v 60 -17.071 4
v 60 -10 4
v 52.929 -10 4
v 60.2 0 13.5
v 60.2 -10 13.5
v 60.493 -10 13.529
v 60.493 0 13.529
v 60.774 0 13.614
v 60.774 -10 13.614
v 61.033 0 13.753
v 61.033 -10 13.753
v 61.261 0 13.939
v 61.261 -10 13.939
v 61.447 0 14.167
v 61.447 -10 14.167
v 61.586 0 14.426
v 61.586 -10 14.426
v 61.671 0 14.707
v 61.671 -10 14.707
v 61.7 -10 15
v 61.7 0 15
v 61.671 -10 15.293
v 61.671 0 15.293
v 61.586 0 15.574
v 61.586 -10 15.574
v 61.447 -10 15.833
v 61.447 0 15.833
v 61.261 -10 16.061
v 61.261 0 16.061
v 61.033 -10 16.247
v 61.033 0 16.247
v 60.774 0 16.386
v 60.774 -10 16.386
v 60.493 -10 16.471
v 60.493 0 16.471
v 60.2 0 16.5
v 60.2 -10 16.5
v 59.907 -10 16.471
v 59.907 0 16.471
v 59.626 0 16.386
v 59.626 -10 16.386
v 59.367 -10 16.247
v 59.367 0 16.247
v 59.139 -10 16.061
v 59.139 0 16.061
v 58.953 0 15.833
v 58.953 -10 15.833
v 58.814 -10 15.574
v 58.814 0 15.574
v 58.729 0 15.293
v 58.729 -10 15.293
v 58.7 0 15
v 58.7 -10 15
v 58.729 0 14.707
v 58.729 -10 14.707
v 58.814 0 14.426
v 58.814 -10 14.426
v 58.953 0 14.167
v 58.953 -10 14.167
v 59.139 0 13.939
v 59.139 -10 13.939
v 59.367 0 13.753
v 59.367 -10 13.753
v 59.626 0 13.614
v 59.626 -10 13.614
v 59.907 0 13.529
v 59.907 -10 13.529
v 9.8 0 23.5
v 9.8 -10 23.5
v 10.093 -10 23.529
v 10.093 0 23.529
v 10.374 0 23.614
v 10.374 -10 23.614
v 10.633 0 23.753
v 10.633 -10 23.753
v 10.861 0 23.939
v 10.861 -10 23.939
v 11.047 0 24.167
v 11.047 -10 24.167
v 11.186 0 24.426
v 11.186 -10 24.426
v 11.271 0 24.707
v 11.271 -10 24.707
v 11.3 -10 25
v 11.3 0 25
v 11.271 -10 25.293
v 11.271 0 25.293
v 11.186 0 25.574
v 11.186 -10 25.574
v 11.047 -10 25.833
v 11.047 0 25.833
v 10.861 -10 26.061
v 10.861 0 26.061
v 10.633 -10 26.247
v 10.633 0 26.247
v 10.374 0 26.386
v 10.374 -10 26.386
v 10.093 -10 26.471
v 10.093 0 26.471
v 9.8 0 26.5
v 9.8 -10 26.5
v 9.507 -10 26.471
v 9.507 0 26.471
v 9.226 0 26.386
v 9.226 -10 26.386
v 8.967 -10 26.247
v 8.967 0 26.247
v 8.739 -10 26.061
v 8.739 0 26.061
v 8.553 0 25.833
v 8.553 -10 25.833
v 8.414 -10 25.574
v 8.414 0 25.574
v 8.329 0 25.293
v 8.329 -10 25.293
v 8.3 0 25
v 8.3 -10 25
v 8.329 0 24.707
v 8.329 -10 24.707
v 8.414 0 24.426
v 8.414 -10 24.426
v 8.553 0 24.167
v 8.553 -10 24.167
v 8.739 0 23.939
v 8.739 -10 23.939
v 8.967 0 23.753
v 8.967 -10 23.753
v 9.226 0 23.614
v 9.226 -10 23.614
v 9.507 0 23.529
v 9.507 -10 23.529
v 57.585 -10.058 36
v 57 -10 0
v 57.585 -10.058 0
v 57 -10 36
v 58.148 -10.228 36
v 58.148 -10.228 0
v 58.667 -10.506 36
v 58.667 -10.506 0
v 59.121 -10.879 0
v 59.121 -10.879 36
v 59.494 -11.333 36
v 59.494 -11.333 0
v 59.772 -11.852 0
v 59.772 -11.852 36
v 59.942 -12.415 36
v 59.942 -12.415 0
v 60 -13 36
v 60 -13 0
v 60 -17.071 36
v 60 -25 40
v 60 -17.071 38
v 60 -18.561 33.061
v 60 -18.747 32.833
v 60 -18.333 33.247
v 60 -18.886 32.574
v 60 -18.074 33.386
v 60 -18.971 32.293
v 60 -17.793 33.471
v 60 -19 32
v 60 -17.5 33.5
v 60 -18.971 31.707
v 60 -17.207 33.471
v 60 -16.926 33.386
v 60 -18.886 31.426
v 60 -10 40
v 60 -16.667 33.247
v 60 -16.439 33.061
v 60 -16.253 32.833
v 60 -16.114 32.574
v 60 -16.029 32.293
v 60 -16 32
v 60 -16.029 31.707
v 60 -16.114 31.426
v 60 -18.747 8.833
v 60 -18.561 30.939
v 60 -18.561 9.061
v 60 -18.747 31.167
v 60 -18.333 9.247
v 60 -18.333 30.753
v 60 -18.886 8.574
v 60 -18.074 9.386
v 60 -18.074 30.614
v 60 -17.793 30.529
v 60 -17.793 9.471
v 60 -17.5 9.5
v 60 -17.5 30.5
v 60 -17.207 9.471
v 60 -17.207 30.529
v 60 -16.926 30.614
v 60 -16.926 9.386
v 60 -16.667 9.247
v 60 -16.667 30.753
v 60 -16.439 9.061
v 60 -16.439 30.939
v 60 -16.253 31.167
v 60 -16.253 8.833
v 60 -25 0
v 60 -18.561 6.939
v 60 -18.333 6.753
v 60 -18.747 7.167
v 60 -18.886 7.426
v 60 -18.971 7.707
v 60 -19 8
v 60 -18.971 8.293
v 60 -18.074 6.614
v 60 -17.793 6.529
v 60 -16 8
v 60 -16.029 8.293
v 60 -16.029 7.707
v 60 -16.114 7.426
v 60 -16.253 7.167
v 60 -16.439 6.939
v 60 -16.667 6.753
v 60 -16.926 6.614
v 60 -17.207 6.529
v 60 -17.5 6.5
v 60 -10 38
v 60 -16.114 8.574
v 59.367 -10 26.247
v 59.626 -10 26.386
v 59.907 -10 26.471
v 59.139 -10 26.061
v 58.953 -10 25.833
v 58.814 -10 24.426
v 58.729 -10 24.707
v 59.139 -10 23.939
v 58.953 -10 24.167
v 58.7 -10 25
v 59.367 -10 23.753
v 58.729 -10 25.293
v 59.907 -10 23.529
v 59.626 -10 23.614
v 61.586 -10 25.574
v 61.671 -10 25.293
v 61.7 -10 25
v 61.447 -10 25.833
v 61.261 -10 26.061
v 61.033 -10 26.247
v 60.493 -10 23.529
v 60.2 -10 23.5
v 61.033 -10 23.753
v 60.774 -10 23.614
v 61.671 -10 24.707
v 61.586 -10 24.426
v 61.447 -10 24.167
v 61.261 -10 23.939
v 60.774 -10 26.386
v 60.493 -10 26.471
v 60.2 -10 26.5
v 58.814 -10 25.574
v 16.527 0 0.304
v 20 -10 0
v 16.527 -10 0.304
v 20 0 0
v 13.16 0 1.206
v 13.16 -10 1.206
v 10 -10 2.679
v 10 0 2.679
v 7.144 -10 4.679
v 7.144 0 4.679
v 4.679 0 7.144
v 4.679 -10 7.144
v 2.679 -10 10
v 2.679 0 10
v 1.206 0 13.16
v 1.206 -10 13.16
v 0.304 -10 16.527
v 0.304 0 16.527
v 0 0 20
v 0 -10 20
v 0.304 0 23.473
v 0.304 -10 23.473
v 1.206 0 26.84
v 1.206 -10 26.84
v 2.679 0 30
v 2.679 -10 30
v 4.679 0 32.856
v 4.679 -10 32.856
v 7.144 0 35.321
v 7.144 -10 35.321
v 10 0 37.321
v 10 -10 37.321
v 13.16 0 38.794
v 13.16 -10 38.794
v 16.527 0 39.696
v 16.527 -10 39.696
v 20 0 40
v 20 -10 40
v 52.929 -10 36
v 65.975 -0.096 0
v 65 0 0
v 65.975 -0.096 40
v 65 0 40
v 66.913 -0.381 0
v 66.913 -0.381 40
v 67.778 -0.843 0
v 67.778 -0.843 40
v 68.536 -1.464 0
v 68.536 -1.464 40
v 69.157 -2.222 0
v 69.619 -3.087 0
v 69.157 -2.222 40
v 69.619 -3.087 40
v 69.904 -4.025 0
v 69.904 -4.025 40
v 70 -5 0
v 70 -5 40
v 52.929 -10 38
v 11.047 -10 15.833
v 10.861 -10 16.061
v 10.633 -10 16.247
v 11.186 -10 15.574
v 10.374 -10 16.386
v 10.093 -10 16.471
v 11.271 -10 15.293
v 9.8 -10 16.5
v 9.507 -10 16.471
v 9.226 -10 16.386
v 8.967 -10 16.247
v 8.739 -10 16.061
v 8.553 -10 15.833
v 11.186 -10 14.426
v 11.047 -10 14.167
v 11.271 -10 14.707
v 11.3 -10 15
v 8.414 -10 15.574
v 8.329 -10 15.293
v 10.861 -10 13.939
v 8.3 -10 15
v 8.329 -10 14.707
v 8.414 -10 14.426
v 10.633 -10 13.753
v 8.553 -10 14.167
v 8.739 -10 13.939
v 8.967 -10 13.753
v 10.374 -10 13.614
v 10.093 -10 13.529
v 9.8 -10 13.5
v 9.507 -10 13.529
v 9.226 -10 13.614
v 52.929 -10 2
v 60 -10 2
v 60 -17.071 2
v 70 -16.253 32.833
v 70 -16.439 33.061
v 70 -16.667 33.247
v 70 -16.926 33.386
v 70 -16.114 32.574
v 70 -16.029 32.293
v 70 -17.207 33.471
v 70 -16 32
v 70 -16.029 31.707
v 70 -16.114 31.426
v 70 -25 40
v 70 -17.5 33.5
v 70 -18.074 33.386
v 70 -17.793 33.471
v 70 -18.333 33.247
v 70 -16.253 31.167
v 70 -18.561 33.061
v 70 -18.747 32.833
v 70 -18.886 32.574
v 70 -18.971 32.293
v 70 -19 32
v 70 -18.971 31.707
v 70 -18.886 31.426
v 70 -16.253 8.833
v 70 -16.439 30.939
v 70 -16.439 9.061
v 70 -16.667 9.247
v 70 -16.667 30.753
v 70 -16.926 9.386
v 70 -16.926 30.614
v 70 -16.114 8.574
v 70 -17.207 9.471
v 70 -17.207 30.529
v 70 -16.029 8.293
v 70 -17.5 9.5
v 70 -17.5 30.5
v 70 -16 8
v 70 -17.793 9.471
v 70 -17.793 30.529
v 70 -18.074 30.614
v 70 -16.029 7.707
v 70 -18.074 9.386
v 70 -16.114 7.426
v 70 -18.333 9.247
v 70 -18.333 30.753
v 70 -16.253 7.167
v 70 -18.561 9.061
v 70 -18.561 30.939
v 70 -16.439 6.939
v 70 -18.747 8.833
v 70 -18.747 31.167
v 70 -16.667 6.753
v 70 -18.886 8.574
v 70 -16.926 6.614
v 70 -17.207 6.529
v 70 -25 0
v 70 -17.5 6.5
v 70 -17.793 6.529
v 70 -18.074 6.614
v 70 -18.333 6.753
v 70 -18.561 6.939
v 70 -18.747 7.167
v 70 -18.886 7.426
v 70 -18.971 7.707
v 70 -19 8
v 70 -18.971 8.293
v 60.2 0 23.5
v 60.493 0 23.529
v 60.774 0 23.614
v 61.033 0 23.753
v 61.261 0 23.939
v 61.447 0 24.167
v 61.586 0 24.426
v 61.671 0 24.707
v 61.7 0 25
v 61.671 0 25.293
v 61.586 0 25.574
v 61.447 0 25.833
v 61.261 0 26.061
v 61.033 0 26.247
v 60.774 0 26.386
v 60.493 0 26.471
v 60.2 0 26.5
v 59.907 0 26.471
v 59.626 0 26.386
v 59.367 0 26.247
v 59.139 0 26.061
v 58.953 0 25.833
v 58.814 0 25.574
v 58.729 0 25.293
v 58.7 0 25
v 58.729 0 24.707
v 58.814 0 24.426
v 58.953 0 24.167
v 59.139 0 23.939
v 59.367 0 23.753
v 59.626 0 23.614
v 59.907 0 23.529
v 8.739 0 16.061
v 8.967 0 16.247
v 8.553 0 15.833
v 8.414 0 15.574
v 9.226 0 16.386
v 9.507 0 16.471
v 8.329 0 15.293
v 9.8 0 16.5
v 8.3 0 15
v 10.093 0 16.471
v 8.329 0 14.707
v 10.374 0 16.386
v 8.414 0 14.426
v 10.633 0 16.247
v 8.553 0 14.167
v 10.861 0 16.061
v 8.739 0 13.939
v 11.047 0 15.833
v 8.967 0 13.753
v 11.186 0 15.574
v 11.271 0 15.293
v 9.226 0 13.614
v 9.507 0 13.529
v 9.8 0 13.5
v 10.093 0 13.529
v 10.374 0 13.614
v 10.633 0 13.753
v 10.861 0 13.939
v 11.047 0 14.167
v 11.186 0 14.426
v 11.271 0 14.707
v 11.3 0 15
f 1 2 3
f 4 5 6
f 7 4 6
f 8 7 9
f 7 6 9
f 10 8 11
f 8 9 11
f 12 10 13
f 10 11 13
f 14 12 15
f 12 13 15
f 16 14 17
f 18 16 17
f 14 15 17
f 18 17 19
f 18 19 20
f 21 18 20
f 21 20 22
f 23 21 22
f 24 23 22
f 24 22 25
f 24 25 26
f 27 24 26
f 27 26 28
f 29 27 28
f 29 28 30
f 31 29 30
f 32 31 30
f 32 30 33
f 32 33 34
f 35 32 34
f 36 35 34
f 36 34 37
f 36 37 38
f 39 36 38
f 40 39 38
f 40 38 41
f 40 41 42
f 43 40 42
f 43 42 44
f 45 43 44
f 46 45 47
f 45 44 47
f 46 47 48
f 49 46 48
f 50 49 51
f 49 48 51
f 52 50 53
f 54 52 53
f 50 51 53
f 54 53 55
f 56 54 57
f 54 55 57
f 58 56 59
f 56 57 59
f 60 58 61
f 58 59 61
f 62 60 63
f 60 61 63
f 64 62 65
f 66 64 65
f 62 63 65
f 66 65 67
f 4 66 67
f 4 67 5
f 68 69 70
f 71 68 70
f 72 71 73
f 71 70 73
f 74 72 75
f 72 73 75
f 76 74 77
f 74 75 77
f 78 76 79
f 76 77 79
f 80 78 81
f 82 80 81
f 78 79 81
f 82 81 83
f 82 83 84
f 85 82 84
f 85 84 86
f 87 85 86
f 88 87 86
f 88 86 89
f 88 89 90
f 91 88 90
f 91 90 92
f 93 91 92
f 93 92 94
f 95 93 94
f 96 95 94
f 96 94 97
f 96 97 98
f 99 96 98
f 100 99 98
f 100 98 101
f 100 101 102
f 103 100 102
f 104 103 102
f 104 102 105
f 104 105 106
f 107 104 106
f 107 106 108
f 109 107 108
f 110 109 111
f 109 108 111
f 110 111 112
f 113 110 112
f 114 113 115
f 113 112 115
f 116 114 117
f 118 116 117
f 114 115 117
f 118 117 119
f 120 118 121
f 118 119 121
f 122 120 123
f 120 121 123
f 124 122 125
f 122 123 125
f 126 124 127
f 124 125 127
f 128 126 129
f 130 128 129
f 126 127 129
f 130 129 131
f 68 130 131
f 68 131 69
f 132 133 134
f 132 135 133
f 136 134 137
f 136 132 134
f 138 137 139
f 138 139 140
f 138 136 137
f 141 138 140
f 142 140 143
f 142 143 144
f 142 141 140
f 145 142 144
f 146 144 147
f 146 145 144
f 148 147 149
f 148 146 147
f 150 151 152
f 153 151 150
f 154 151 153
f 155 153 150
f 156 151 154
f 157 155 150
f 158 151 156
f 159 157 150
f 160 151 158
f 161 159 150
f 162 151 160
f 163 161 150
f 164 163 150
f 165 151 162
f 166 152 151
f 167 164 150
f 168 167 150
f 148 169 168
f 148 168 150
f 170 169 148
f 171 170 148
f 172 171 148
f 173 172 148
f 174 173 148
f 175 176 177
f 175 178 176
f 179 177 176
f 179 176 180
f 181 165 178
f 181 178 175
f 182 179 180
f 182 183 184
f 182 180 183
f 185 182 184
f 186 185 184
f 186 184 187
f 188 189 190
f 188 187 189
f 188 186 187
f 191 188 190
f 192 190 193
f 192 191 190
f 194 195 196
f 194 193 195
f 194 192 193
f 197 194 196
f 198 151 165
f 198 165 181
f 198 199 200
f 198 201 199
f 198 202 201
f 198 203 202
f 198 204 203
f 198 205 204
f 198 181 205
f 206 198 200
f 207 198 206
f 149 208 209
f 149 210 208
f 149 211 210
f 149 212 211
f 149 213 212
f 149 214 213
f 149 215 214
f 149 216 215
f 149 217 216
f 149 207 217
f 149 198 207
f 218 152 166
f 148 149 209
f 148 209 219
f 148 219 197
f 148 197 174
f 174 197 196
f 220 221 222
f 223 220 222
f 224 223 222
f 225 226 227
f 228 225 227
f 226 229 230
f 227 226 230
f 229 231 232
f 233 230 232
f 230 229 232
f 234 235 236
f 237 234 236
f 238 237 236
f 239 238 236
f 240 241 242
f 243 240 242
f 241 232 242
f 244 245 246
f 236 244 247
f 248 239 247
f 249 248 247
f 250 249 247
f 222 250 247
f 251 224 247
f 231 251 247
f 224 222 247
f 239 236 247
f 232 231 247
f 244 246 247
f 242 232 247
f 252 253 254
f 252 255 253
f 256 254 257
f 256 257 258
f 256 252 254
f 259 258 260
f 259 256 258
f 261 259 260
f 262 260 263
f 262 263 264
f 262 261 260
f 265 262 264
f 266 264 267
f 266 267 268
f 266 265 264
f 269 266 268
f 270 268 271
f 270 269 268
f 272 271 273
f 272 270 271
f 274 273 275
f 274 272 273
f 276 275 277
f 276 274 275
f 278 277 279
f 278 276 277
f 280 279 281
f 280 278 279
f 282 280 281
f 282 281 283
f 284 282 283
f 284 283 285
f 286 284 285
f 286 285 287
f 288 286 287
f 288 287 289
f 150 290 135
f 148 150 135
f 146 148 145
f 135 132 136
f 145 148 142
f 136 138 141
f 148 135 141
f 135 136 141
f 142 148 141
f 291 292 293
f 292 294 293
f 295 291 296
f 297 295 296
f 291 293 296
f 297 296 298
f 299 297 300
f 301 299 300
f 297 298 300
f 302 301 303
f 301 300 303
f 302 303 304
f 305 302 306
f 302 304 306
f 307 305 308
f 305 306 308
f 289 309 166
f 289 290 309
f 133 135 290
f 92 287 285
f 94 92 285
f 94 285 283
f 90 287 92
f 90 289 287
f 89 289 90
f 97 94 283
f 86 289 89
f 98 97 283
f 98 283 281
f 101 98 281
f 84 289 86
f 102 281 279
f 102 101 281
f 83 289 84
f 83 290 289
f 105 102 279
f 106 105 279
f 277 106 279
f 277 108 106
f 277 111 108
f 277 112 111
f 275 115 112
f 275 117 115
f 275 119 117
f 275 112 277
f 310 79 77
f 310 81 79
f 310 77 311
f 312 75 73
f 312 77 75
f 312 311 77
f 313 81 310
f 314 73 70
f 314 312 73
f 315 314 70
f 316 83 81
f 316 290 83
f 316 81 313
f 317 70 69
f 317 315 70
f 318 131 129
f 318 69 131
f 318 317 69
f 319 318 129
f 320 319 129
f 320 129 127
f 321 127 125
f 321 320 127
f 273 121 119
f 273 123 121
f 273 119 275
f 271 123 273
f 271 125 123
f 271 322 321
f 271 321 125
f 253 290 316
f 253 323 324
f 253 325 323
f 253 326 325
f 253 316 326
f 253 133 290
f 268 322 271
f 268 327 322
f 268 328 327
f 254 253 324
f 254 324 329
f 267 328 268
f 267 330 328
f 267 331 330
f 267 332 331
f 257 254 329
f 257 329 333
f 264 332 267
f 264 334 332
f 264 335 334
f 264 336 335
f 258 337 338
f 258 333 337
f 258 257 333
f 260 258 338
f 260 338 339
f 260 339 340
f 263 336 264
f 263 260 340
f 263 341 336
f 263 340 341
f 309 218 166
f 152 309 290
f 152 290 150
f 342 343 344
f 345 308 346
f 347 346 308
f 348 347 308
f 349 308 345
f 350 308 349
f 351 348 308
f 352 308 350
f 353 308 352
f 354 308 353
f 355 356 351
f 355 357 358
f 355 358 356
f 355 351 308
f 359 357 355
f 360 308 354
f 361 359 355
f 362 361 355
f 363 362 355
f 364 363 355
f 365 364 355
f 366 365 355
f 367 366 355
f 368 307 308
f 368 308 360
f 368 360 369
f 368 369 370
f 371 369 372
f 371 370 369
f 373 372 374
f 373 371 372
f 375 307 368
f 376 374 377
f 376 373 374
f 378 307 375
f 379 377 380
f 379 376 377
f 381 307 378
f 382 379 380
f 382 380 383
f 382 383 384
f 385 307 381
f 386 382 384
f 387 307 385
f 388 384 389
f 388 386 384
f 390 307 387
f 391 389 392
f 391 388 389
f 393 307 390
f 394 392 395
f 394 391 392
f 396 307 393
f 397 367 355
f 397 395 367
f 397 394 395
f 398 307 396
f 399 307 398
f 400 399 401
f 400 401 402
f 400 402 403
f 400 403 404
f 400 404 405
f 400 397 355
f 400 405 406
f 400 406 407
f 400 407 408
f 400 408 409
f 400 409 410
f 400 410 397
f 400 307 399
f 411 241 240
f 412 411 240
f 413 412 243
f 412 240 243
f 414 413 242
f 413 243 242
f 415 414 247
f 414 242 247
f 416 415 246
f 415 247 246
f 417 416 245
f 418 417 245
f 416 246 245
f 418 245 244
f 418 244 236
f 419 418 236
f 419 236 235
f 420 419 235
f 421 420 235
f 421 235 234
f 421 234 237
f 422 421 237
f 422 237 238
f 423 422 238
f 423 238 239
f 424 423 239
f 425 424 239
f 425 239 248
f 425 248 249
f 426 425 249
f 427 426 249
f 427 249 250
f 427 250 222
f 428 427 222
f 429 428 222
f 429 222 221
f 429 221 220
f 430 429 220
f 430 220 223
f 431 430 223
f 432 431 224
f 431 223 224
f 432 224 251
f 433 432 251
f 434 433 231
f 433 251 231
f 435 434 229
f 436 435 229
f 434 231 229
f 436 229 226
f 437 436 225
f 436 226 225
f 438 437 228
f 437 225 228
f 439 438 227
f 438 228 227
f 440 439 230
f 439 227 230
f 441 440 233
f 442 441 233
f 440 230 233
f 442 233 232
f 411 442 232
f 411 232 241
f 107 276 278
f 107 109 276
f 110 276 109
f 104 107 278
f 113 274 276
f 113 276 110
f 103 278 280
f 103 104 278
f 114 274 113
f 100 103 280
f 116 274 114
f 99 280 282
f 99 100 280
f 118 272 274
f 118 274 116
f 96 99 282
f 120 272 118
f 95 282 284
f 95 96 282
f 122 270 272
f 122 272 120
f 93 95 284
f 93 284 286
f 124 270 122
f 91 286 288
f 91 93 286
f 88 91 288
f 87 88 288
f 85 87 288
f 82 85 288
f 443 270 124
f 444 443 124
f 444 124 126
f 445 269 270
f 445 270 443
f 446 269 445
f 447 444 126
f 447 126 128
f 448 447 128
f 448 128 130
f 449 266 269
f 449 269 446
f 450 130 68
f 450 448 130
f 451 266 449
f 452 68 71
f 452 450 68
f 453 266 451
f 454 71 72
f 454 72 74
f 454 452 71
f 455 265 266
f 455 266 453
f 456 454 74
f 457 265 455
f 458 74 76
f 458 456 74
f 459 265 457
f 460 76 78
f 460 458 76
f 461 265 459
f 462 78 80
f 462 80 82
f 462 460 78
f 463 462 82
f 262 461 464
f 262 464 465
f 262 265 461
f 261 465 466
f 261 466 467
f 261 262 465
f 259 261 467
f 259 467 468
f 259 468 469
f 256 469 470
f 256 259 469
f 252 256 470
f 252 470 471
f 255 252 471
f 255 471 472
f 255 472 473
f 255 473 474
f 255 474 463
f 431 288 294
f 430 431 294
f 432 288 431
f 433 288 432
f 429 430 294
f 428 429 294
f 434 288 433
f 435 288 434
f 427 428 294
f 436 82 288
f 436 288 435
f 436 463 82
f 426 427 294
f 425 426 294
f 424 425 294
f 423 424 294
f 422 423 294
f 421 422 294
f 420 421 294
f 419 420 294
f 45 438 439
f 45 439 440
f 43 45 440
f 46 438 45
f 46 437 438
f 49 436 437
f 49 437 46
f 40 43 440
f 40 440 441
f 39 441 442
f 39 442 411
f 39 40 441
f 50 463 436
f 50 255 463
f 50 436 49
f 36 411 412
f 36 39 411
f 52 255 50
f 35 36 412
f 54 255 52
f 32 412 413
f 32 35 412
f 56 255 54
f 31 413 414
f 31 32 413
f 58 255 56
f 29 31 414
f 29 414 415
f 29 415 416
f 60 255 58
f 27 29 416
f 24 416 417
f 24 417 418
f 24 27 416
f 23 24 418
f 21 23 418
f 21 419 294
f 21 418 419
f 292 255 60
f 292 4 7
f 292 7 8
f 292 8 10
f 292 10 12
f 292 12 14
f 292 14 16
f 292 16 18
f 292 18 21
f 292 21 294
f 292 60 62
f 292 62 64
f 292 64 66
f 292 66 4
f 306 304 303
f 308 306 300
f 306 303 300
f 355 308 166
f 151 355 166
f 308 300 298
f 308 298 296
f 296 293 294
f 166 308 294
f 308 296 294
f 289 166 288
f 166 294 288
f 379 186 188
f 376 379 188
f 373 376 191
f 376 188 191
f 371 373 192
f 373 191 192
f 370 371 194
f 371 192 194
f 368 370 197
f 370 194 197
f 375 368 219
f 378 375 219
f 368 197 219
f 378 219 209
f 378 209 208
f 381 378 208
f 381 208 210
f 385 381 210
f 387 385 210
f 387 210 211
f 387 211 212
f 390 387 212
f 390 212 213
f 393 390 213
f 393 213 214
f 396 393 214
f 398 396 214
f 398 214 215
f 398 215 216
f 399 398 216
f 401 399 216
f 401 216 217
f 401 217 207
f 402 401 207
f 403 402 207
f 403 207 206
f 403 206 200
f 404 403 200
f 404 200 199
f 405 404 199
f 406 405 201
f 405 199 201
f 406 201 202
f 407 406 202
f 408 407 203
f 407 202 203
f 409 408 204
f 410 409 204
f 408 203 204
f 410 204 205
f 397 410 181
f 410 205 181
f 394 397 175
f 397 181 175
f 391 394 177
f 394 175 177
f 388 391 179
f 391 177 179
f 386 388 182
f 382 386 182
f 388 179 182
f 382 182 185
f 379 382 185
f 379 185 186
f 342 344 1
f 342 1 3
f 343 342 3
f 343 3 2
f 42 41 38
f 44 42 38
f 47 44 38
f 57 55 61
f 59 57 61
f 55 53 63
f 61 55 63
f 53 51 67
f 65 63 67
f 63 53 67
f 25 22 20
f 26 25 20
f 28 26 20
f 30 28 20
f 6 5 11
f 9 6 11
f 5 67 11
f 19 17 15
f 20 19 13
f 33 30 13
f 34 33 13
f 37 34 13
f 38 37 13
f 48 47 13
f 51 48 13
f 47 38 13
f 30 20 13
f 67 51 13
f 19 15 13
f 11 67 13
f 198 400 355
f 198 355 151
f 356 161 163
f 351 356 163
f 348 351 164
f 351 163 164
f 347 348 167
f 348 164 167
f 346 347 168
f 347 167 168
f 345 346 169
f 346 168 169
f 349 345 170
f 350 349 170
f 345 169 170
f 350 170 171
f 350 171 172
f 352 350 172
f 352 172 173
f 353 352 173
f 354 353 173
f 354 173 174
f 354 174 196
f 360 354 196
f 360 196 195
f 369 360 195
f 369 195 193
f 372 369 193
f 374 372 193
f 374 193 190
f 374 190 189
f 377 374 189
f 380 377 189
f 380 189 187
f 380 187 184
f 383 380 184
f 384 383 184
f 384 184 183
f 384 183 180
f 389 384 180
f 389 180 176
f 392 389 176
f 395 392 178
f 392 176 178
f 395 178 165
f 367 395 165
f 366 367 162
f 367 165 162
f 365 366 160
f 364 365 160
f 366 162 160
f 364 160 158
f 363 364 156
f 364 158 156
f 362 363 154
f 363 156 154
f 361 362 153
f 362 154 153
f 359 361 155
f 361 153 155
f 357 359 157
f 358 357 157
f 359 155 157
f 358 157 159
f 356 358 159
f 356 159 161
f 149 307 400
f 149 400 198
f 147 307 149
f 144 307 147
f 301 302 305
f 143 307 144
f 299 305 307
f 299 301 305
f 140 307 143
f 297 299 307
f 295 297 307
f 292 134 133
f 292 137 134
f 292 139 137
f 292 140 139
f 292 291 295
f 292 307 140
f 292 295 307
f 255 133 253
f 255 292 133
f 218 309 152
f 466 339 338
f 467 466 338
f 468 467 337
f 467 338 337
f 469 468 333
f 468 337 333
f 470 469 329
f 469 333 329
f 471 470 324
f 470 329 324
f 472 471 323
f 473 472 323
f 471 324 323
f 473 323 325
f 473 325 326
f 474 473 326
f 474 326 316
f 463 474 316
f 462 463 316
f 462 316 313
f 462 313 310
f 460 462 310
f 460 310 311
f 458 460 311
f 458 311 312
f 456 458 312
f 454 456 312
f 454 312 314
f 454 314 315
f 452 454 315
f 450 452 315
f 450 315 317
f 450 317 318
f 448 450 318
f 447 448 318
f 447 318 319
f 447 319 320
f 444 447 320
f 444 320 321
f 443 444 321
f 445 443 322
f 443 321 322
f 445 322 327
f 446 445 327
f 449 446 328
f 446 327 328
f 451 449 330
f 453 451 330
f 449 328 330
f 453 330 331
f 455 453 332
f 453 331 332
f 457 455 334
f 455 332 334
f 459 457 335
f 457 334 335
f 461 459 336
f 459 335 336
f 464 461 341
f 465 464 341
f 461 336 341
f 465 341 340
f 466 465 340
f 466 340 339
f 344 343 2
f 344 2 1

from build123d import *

# Parameters (mm, degrees)
BOSS_EXTRU_1_DEPTH      = 40
ESQUISSE2_R             = 1.5
ENL_V_MAT_EXTRU_1_DEPTH = 40
BOSS_EXTRU_2_START      = -2
BOSS_EXTRU_2_DEPTH      = 2
BOSS_EXTRU_3_START      = -2
BOSS_EXTRU_3_DEPTH      = 2
CONG_1_R                = 5
CONG_2_R                = 3
CONG_3_RADIUS           = 20
CONG_3_LENGTH           = 10
ESQUISSE5_R             = 1.5
ENL_V_MAT_EXTRU_2_DEPTH = 83.006097334


with BuildPart() as part:
    # Esquisse1 → Boss.-Extru.1 (new body)
    with BuildSketch(Plane.XY):
        Polygon((0, 0), (70, 0), (70, -25), (60, -25), (60, -10), (0, -10), align=None)
    extrude(amount=BOSS_EXTRU_1_DEPTH)

    # Esquisse2 → Enlèv. mat.-Extru.1 (cut)
    with BuildSketch(Plane.ZY.offset(-60)):
        with Locations((8, -17.5)):
            Circle(ESQUISSE2_R)
        with Locations((32, -17.5)):
            Circle(ESQUISSE2_R)
    extrude(amount=-ENL_V_MAT_EXTRU_1_DEPTH, mode=Mode.SUBTRACT)

    # Esquisse4 → Boss.-Extru.3 (add)
    with BuildSketch(Plane.XY.offset(40).offset(BOSS_EXTRU_3_START)):
        Polygon((60, -10), (52.928932188, -10), (60, -17.071067812), align=None)
    extrude(amount=-BOSS_EXTRU_3_DEPTH)

    # Congé1
    cong_1_edges = [part.edges().sort_by_distance(p)[0] for p in [
        (70, 0, 20),
    ]]
    fillet(cong_1_edges, radius=CONG_1_R)

    # Congé2
    cong_2_edges = [part.edges().sort_by_distance(p)[0] for p in [
        (60, -10, 18),
    ]]
    fillet(cong_2_edges, radius=CONG_2_R)

    # Congé3: full round fillet: the end face becomes a half cylinder, R = half its width
    cong_3_face = Plane((0, -5, 20), x_dir=(0, 1, 0), z_dir=(-1, 0, 0))  # on the end face: x along it, z out of the body
    cong_3_slab = cong_3_face.offset(-CONG_3_RADIUS / 2) * Box(CONG_3_LENGTH, 2 * CONG_3_RADIUS, CONG_3_RADIUS, mode=Mode.PRIVATE)  # the body's end, R deep
    cong_3_round = Plane((20, -5, 20), x_dir=(-1, 0, 0), z_dir=(0, 1, 0)) * Cylinder(CONG_3_RADIUS, CONG_3_LENGTH, mode=Mode.PRIVATE)  # its axis R under the face
    add(cong_3_slab - cong_3_round, mode=Mode.SUBTRACT)

    # Esquisse5 → Enlèv. mat.-Extru.2 (cut, through all)
    with BuildSketch(Plane.XZ.offset(10)):
        with Locations(Location((60.2, 25, 0), (0, 0, 270))):
            Circle(ESQUISSE5_R)
        with Locations(Location((60.2, 15, 0), (0, 0, 270))):
            Circle(ESQUISSE5_R)
        with Locations(Location((9.8, 25, 0), (0, 0, 270))):
            Circle(ESQUISSE5_R)
        with Locations(Location((9.8, 15, 0), (0, 0, 270))):
            Circle(ESQUISSE5_R)
    extrude(amount=-ENL_V_MAT_EXTRU_2_DEPTH, mode=Mode.SUBTRACT)


with BuildPart() as body_2:
    # Esquisse3 → Boss.-Extru.2 (new body)
    with BuildSketch(Plane(origin=(0, 0, 0), x_dir=(-1, 0, 0), z_dir=(0, 0, -1)).offset(BOSS_EXTRU_2_START)):
        Polygon((-60, -10), (-60, -17.071067812), (-52.928932188, -10), align=None)
    extrude(amount=-BOSS_EXTRU_2_DEPTH)


solid = Compound([part.part, body_2.part])
